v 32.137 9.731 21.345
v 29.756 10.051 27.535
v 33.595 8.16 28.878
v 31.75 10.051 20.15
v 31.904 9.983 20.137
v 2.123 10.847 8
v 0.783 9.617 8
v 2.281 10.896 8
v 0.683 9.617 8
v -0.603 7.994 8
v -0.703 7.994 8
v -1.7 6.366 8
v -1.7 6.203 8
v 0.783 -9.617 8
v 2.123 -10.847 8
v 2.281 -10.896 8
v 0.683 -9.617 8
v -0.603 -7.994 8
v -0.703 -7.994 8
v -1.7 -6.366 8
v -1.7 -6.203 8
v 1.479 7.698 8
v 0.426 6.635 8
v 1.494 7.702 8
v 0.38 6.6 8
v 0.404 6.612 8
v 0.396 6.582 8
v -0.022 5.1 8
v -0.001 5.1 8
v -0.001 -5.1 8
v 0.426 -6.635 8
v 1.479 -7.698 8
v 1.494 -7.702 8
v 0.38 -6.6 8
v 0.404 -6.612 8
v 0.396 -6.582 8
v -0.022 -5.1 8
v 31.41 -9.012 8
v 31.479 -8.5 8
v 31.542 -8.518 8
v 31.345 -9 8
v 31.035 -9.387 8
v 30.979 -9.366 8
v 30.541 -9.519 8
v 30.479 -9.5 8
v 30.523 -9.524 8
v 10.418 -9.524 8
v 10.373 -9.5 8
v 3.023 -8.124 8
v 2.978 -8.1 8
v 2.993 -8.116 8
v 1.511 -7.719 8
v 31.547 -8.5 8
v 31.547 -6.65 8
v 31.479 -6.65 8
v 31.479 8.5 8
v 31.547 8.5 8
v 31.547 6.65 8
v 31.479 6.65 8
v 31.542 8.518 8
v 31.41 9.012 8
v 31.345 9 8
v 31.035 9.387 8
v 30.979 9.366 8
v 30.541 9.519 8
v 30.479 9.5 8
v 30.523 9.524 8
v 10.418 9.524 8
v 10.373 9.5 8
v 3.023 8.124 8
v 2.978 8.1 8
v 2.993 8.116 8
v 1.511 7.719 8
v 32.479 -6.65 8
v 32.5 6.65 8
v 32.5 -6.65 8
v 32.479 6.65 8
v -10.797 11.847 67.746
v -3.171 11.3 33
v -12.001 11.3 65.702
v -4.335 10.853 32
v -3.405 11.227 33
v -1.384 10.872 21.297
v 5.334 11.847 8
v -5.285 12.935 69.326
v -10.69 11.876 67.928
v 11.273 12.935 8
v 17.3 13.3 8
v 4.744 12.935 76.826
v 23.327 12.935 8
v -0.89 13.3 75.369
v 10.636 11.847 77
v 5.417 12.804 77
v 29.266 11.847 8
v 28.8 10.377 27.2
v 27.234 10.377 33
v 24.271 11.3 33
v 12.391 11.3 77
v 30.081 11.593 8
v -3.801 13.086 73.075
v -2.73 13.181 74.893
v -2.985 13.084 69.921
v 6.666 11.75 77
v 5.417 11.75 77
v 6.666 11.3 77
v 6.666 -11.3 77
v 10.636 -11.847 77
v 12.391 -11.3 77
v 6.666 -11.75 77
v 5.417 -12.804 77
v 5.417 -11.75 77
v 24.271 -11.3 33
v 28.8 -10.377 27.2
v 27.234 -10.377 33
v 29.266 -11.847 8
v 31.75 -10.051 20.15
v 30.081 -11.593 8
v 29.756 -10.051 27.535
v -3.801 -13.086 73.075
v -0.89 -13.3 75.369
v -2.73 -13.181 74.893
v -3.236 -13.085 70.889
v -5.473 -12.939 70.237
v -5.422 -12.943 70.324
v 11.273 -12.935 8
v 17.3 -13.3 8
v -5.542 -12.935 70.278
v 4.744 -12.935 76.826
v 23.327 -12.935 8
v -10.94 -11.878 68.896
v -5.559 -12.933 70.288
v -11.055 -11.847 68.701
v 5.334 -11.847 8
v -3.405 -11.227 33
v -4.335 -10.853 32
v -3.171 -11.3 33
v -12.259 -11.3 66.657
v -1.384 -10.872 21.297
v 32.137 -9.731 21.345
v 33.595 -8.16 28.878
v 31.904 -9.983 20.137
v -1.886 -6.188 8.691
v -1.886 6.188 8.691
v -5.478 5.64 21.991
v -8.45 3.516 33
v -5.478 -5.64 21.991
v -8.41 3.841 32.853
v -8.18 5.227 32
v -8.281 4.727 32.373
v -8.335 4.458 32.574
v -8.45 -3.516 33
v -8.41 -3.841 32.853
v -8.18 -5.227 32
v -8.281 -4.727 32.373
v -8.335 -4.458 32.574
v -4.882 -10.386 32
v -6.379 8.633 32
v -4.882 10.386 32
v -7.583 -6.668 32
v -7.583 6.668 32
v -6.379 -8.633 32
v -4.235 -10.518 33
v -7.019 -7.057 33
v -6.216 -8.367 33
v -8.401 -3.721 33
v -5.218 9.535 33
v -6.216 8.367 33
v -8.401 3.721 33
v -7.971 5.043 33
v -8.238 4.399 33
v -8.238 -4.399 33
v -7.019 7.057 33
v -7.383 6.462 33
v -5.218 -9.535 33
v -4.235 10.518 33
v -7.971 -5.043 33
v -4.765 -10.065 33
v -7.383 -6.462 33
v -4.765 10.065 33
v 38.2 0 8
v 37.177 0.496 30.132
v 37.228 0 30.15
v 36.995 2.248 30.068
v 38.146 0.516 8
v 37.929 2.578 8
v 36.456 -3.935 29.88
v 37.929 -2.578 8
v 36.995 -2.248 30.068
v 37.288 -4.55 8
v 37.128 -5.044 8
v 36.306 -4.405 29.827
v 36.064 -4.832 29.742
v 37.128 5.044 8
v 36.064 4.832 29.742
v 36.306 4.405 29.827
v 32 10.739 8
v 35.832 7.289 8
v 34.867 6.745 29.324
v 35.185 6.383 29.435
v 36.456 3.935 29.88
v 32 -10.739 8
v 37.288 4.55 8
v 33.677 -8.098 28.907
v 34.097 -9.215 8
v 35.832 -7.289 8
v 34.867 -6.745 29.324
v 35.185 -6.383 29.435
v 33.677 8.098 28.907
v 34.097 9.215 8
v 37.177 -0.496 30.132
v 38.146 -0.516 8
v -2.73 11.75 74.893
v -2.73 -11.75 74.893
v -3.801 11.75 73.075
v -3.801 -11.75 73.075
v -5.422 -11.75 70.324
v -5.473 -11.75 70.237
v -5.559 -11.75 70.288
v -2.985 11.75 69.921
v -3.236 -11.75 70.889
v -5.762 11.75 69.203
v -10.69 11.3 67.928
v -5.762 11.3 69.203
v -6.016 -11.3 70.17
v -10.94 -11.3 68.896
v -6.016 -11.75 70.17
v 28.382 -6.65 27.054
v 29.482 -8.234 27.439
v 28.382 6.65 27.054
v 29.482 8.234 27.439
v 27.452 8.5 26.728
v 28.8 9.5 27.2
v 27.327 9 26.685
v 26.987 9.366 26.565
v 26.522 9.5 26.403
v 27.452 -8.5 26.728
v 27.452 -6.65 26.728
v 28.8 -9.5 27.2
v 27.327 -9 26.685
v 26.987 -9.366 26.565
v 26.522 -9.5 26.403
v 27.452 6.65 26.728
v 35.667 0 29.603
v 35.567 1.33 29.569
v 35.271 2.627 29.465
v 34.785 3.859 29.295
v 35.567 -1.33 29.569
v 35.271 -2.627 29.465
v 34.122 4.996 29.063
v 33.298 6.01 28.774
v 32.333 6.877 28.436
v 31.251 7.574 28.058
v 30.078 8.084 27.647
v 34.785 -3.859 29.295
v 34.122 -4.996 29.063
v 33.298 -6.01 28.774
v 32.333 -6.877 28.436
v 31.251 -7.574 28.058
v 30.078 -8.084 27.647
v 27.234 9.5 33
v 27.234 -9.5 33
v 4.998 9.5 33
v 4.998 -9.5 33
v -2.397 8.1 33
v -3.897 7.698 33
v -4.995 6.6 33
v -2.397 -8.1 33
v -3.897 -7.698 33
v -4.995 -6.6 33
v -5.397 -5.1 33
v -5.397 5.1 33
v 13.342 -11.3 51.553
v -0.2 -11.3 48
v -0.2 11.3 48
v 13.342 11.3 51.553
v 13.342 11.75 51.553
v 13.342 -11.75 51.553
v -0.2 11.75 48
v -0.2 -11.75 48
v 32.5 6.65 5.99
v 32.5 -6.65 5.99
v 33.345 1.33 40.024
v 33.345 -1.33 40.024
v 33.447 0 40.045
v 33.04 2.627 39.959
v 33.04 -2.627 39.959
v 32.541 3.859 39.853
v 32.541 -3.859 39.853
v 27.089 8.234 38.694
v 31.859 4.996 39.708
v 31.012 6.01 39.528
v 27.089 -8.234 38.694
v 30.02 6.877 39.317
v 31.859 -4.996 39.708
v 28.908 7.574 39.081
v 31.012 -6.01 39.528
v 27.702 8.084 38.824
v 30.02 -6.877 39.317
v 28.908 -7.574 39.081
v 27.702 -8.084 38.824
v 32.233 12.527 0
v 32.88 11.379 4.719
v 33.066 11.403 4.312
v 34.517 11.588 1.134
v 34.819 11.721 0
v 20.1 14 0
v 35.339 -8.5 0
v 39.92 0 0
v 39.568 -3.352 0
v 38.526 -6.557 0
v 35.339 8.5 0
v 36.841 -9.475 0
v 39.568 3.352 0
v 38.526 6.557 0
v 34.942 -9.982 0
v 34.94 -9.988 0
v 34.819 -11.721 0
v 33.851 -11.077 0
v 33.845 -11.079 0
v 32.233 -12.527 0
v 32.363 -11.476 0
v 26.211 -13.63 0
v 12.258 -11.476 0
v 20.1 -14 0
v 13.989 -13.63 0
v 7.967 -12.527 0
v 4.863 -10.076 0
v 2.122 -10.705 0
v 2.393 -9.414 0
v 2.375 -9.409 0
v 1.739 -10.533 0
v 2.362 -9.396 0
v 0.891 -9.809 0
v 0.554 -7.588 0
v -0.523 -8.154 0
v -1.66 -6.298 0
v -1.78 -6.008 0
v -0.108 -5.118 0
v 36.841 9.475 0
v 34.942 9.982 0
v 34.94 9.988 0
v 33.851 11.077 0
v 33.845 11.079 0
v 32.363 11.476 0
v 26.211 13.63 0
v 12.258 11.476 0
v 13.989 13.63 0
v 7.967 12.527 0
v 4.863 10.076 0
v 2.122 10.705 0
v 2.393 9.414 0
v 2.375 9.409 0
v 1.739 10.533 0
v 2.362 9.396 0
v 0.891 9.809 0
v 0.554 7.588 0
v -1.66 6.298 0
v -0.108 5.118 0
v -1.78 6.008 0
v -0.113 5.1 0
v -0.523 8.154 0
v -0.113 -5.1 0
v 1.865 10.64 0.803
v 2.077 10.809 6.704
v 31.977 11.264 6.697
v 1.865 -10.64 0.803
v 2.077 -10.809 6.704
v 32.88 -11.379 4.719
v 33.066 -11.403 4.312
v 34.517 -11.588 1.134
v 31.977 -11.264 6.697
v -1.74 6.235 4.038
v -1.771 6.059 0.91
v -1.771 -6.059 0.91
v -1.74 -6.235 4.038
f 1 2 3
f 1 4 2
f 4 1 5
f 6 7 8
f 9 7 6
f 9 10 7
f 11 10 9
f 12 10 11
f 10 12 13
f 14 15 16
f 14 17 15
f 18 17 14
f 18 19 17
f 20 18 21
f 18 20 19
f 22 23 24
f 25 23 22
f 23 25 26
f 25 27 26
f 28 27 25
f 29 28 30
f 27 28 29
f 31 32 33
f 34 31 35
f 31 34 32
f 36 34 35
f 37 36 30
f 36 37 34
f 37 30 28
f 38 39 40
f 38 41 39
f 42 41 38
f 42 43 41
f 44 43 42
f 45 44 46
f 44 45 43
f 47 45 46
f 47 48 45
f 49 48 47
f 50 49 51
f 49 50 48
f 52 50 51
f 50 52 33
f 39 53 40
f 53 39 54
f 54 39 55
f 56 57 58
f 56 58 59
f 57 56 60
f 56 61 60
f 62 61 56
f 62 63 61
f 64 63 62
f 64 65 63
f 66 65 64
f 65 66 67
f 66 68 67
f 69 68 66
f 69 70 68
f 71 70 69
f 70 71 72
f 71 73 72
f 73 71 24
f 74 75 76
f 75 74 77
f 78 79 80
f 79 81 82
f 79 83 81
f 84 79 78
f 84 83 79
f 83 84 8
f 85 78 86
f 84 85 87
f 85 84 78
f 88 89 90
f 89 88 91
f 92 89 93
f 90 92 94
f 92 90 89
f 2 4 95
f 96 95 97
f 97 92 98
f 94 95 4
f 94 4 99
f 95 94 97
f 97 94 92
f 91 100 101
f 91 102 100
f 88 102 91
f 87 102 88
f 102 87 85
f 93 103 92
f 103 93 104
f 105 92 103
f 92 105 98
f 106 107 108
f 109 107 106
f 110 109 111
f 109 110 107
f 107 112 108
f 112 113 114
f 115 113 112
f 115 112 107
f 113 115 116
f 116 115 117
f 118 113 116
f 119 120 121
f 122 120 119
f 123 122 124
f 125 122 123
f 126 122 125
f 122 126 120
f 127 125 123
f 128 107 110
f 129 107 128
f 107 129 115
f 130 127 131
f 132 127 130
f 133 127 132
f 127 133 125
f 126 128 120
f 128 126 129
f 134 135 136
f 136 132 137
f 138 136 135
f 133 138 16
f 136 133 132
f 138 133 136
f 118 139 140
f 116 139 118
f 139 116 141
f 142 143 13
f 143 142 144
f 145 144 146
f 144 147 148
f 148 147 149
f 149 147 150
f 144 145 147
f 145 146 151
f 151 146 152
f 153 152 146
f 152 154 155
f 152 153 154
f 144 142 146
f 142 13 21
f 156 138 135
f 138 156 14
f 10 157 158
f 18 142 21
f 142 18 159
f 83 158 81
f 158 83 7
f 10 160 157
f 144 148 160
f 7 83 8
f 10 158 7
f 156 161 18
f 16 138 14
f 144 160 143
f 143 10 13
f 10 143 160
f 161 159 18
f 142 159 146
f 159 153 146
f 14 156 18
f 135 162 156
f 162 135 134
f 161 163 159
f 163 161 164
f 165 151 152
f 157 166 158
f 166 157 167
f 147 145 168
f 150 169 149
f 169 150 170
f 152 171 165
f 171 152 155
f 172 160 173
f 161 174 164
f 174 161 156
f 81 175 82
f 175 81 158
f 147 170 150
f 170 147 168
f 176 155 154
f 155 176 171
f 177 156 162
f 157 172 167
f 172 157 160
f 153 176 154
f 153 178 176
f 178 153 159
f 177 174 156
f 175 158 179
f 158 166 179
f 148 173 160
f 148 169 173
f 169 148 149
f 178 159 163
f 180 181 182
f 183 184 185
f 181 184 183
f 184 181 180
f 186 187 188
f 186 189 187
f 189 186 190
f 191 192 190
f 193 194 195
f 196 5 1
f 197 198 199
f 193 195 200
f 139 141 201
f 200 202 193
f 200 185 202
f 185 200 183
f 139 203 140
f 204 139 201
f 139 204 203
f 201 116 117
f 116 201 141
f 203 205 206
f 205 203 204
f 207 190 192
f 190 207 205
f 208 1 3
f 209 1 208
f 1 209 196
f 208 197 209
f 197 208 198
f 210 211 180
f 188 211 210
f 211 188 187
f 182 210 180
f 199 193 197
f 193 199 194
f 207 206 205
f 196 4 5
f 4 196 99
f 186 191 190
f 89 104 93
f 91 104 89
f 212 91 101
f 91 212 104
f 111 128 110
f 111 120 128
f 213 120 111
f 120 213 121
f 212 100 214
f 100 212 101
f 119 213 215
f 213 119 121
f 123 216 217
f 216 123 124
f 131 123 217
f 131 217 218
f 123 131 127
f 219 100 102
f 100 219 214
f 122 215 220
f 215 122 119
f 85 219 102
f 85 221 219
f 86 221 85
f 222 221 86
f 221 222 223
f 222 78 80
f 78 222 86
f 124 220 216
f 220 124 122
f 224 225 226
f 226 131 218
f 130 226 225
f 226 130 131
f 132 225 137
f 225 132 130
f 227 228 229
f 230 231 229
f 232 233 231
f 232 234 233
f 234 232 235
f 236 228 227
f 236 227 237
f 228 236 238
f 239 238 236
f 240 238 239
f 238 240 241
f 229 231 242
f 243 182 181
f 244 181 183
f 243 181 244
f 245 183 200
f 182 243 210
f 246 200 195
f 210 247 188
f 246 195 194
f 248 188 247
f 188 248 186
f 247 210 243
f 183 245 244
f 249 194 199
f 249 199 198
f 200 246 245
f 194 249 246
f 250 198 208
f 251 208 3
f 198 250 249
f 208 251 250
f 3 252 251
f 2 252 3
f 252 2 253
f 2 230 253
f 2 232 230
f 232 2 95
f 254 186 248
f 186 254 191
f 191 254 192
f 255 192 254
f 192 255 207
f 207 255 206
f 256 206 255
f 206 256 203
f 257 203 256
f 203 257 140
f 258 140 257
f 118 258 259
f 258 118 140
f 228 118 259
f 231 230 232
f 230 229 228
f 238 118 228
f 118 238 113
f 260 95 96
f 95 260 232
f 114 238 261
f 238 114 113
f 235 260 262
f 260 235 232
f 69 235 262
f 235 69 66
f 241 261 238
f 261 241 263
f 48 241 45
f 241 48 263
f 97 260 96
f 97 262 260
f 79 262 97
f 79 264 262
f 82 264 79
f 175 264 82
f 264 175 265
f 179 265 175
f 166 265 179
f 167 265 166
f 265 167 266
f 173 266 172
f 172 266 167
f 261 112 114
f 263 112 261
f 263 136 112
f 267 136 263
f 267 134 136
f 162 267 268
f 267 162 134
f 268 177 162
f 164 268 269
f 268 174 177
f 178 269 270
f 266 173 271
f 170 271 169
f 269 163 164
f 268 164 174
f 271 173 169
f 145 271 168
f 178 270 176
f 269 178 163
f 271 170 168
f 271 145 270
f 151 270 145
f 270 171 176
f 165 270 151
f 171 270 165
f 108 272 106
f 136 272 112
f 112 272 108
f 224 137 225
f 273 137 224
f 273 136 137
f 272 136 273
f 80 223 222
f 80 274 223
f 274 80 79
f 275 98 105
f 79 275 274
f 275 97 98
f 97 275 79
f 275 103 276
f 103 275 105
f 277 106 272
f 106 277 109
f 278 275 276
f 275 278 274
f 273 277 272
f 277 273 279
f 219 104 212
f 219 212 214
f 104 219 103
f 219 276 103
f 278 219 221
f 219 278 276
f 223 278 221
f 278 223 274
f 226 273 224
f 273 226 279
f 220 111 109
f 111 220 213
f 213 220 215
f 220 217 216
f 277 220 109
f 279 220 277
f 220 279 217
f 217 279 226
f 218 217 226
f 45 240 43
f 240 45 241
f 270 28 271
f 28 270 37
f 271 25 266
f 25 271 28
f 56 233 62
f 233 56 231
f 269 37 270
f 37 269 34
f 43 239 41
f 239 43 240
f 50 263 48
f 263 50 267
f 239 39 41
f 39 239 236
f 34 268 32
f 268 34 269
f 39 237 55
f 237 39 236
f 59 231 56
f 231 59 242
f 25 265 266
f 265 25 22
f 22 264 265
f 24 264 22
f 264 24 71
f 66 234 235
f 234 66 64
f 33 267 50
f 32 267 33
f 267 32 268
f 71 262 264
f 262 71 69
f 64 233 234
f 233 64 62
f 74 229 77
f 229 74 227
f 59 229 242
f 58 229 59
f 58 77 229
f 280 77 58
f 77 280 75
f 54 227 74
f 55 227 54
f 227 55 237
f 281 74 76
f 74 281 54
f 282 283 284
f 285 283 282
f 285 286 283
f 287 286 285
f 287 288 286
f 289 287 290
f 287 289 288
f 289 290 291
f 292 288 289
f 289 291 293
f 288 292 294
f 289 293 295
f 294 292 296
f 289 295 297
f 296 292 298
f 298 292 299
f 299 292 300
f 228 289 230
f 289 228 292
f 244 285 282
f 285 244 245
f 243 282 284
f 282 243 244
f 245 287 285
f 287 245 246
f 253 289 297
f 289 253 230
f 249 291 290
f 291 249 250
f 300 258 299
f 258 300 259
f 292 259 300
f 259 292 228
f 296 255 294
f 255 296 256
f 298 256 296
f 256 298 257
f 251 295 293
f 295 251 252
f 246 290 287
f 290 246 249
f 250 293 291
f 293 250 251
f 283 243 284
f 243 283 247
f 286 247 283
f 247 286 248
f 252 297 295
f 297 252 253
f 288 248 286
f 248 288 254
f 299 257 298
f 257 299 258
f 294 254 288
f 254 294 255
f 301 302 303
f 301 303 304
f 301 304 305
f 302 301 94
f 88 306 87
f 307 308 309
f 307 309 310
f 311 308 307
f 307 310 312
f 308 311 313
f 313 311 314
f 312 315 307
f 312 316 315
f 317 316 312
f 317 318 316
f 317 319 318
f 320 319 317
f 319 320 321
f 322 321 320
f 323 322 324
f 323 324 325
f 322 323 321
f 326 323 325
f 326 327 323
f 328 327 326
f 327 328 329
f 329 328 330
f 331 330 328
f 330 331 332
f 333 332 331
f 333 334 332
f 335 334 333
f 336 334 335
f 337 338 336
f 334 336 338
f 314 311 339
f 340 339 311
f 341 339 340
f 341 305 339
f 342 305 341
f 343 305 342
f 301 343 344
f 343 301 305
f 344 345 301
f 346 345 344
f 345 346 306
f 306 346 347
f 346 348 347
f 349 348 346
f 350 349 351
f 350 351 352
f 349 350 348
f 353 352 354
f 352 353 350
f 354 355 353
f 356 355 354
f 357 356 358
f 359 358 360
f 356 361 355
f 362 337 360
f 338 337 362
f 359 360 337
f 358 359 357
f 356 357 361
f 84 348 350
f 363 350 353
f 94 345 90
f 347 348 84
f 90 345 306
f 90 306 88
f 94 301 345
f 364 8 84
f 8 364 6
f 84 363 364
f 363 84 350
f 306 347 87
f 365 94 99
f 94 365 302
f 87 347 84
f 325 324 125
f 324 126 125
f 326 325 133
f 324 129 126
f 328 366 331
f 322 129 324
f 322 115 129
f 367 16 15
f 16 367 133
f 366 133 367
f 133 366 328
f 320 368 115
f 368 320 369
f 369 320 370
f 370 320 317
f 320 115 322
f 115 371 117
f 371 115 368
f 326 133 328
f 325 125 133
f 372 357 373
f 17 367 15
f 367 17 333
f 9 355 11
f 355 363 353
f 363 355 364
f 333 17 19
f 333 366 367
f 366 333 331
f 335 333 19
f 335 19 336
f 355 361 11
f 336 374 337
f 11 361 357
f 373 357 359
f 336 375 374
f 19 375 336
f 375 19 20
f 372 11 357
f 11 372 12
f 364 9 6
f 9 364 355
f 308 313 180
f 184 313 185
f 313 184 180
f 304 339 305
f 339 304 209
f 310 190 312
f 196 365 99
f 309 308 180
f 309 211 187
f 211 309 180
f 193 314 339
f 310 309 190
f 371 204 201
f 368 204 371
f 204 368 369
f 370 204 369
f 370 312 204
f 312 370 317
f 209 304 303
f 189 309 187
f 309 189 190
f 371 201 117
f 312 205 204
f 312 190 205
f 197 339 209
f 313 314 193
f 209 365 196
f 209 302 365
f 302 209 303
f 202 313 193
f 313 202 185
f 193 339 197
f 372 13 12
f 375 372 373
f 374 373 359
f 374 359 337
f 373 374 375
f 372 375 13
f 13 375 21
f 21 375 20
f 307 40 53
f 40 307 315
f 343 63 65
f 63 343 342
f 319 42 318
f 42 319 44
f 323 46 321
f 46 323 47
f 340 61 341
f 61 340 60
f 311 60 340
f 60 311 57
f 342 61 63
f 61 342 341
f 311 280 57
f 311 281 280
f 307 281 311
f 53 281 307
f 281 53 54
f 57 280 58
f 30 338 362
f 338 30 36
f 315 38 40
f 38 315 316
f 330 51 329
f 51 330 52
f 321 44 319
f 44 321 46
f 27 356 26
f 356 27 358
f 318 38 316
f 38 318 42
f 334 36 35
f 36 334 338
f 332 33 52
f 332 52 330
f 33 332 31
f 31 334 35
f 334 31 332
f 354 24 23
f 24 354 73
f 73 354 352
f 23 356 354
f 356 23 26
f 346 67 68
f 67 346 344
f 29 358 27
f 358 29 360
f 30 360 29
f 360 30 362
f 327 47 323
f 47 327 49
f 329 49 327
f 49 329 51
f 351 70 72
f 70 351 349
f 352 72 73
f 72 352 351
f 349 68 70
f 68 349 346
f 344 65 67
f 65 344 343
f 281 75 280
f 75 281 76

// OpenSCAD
//
// Glock(r) 42 grip extension "G42K"
//
// For use with ETS 12-round magazines only.
//
// Copyright (c) 2019 Pete Zaitcev
//

use <g42k.scad>;

funnel_height = 8.0;

// This must match the mag_cavity() module precisely.
module sport_cavity (height) {

    front_r = 3.0;

    cav_width_rear = f_mag_cav_width_rear();
    cav_width_nose = 16.2;
    cav_length = 31.5;  // note that scalloping makes it longer

    translate ([0, 0, height]) mirror ([0, 0, 1]) {
        union () {
            multmatrix(m = [[   1,   0,   0.23,  0],
                            [   0,   1,   0,     0],
                            [   0,   0,   1,     0],
                            [   0,   0,   0,     1]])
            {
                hull () {
                    // XXX This $fn has no effect for an unknown reason.
                    // $fn = 18;
                    translate([front_r, (cav_width_nose/2 - front_r)*-1, 0])
                        cylinder(height, front_r, front_r+2.0);
                    translate([front_r, (cav_width_nose/2 - front_r), 0])
                        cylinder(height, front_r, front_r+2.0);

                    translate([cav_length*0.33,
                               (cav_width_rear/2 - front_r)*-1, 0])
                        cylinder(height, front_r, front_r+2.0);
                    translate([cav_length*0.33,
                               (cav_width_rear/2 - front_r), 0])
                        cylinder(height, front_r, front_r+2.0);

                    rear_r = 1.0;
                    // very small circles in the rear of the cavity
                    $fn = 12;
                    translate([cav_length - rear_r,
                               (cav_width_rear/2 - rear_r)*-1, 0])
                        cylinder(height, rear_r, rear_r+2.0);
                    translate([cav_length - rear_r,
                               (cav_width_rear/2 - rear_r), 0])
                        cylinder(height, rear_r, rear_r+2.0);
                }

            }
            translate([1.0, ((cav_width_rear*0.7)/2)*-1, 0])
                cube([cav_length, cav_width_rear*0.7, height]);
        }
    }
}

module sport_body (height) {
    butt_width = f_butt_width();

    side_r = 50;
    front_r = 13.6;
    back_r = 12.4;

    front_face = 10.3;
    rear_face = 25.8;

    // This mirror thing helps us to match the base exactly. We use the
    // same exact parameters from g42k, then skew with multimatrix.
    // The bottom remains where it was, matching the base. Then we mirror.
    translate ([0, 0, height]) mirror ([0, 0, 1]) {

        intersection () {

            multmatrix(m = [[   1,   0,   0.35,  0],
                            [   0,   1,   0,     0],
                            [   0,   0,   1,     0],
                            [   0,   0,   0,     1]])
            {
                // This translation distance has to have something to do with
                // butt_width and side_r... Maybe cos(side_r) == butt_width/2.
                // But we just hard-code it for now to the same 17.3 value.
                translate ([17.3, 0, 0]) {
                    intersection () {
                        $fn = 52;
                        translate([0, (side_r - butt_width/2)*-1, 0])
                            cylinder(height, side_r, side_r*1.014);
                        translate([0, side_r - butt_width/2, 0])
                            cylinder(height, side_r, side_r*1.014);
                    }
                }
            }

            multmatrix(m = [[   1,   0,  -0.01,  0],
                            [   0,   1,   0,    0],
                            [   0,   0,   1,    0],
                            [   0,   0,   0,    1]])
            {

                // Front strap
                translate([-1.7, ((butt_width * 1.1)/2)*-1, 0])
                    cube([100, butt_width * 1.1, height]);
            }

            multmatrix(m = [[   1,   0,   0.05, 0],
                            [   0,   1,   0,    0],
                            [   0,   0,   1,    0],
                            [   0,   0,   0,    1]])
            {
                union () {
                    $fn = 40;

                    // front bevel of a large radius
                    translate([front_face, 0, 0])
                        cylinder(height, front_r, front_r*1.02);
                    // wide cube
                    translate([front_face - 3, ((butt_width * 1.1)/2)*-1, 0])
                        cube([100, butt_width * 1.1, height]);
                }
            }

            multmatrix(m = [[   1,   0,  -0.25,  0],
                            [   0,   1,   0,    0],
                            [   0,   0,   1,    0],
                            [   0,   0,   0,    1]])
            {
                union () {
                    // back bevel of a large radius
                    translate([rear_face, 0, 0])
                        cylinder(height, back_r, back_r*1.3);
                    // wide cube
                    translate([(rear_face + 3) - 100,
                               ((butt_width * 1.1)/2)*-1, 0])
                        cube([100, butt_width * 1.1, height]);
                }
            }
        }
    }
}

module sport_funnel () {
    difference () {
        sport_body(funnel_height); 
        translate([0, 0, -0.1])
            sport_cavity(funnel_height+0.2);
    }
}

translate([0, 0, funnel_height])
    g42k_base();
sport_funnel();
